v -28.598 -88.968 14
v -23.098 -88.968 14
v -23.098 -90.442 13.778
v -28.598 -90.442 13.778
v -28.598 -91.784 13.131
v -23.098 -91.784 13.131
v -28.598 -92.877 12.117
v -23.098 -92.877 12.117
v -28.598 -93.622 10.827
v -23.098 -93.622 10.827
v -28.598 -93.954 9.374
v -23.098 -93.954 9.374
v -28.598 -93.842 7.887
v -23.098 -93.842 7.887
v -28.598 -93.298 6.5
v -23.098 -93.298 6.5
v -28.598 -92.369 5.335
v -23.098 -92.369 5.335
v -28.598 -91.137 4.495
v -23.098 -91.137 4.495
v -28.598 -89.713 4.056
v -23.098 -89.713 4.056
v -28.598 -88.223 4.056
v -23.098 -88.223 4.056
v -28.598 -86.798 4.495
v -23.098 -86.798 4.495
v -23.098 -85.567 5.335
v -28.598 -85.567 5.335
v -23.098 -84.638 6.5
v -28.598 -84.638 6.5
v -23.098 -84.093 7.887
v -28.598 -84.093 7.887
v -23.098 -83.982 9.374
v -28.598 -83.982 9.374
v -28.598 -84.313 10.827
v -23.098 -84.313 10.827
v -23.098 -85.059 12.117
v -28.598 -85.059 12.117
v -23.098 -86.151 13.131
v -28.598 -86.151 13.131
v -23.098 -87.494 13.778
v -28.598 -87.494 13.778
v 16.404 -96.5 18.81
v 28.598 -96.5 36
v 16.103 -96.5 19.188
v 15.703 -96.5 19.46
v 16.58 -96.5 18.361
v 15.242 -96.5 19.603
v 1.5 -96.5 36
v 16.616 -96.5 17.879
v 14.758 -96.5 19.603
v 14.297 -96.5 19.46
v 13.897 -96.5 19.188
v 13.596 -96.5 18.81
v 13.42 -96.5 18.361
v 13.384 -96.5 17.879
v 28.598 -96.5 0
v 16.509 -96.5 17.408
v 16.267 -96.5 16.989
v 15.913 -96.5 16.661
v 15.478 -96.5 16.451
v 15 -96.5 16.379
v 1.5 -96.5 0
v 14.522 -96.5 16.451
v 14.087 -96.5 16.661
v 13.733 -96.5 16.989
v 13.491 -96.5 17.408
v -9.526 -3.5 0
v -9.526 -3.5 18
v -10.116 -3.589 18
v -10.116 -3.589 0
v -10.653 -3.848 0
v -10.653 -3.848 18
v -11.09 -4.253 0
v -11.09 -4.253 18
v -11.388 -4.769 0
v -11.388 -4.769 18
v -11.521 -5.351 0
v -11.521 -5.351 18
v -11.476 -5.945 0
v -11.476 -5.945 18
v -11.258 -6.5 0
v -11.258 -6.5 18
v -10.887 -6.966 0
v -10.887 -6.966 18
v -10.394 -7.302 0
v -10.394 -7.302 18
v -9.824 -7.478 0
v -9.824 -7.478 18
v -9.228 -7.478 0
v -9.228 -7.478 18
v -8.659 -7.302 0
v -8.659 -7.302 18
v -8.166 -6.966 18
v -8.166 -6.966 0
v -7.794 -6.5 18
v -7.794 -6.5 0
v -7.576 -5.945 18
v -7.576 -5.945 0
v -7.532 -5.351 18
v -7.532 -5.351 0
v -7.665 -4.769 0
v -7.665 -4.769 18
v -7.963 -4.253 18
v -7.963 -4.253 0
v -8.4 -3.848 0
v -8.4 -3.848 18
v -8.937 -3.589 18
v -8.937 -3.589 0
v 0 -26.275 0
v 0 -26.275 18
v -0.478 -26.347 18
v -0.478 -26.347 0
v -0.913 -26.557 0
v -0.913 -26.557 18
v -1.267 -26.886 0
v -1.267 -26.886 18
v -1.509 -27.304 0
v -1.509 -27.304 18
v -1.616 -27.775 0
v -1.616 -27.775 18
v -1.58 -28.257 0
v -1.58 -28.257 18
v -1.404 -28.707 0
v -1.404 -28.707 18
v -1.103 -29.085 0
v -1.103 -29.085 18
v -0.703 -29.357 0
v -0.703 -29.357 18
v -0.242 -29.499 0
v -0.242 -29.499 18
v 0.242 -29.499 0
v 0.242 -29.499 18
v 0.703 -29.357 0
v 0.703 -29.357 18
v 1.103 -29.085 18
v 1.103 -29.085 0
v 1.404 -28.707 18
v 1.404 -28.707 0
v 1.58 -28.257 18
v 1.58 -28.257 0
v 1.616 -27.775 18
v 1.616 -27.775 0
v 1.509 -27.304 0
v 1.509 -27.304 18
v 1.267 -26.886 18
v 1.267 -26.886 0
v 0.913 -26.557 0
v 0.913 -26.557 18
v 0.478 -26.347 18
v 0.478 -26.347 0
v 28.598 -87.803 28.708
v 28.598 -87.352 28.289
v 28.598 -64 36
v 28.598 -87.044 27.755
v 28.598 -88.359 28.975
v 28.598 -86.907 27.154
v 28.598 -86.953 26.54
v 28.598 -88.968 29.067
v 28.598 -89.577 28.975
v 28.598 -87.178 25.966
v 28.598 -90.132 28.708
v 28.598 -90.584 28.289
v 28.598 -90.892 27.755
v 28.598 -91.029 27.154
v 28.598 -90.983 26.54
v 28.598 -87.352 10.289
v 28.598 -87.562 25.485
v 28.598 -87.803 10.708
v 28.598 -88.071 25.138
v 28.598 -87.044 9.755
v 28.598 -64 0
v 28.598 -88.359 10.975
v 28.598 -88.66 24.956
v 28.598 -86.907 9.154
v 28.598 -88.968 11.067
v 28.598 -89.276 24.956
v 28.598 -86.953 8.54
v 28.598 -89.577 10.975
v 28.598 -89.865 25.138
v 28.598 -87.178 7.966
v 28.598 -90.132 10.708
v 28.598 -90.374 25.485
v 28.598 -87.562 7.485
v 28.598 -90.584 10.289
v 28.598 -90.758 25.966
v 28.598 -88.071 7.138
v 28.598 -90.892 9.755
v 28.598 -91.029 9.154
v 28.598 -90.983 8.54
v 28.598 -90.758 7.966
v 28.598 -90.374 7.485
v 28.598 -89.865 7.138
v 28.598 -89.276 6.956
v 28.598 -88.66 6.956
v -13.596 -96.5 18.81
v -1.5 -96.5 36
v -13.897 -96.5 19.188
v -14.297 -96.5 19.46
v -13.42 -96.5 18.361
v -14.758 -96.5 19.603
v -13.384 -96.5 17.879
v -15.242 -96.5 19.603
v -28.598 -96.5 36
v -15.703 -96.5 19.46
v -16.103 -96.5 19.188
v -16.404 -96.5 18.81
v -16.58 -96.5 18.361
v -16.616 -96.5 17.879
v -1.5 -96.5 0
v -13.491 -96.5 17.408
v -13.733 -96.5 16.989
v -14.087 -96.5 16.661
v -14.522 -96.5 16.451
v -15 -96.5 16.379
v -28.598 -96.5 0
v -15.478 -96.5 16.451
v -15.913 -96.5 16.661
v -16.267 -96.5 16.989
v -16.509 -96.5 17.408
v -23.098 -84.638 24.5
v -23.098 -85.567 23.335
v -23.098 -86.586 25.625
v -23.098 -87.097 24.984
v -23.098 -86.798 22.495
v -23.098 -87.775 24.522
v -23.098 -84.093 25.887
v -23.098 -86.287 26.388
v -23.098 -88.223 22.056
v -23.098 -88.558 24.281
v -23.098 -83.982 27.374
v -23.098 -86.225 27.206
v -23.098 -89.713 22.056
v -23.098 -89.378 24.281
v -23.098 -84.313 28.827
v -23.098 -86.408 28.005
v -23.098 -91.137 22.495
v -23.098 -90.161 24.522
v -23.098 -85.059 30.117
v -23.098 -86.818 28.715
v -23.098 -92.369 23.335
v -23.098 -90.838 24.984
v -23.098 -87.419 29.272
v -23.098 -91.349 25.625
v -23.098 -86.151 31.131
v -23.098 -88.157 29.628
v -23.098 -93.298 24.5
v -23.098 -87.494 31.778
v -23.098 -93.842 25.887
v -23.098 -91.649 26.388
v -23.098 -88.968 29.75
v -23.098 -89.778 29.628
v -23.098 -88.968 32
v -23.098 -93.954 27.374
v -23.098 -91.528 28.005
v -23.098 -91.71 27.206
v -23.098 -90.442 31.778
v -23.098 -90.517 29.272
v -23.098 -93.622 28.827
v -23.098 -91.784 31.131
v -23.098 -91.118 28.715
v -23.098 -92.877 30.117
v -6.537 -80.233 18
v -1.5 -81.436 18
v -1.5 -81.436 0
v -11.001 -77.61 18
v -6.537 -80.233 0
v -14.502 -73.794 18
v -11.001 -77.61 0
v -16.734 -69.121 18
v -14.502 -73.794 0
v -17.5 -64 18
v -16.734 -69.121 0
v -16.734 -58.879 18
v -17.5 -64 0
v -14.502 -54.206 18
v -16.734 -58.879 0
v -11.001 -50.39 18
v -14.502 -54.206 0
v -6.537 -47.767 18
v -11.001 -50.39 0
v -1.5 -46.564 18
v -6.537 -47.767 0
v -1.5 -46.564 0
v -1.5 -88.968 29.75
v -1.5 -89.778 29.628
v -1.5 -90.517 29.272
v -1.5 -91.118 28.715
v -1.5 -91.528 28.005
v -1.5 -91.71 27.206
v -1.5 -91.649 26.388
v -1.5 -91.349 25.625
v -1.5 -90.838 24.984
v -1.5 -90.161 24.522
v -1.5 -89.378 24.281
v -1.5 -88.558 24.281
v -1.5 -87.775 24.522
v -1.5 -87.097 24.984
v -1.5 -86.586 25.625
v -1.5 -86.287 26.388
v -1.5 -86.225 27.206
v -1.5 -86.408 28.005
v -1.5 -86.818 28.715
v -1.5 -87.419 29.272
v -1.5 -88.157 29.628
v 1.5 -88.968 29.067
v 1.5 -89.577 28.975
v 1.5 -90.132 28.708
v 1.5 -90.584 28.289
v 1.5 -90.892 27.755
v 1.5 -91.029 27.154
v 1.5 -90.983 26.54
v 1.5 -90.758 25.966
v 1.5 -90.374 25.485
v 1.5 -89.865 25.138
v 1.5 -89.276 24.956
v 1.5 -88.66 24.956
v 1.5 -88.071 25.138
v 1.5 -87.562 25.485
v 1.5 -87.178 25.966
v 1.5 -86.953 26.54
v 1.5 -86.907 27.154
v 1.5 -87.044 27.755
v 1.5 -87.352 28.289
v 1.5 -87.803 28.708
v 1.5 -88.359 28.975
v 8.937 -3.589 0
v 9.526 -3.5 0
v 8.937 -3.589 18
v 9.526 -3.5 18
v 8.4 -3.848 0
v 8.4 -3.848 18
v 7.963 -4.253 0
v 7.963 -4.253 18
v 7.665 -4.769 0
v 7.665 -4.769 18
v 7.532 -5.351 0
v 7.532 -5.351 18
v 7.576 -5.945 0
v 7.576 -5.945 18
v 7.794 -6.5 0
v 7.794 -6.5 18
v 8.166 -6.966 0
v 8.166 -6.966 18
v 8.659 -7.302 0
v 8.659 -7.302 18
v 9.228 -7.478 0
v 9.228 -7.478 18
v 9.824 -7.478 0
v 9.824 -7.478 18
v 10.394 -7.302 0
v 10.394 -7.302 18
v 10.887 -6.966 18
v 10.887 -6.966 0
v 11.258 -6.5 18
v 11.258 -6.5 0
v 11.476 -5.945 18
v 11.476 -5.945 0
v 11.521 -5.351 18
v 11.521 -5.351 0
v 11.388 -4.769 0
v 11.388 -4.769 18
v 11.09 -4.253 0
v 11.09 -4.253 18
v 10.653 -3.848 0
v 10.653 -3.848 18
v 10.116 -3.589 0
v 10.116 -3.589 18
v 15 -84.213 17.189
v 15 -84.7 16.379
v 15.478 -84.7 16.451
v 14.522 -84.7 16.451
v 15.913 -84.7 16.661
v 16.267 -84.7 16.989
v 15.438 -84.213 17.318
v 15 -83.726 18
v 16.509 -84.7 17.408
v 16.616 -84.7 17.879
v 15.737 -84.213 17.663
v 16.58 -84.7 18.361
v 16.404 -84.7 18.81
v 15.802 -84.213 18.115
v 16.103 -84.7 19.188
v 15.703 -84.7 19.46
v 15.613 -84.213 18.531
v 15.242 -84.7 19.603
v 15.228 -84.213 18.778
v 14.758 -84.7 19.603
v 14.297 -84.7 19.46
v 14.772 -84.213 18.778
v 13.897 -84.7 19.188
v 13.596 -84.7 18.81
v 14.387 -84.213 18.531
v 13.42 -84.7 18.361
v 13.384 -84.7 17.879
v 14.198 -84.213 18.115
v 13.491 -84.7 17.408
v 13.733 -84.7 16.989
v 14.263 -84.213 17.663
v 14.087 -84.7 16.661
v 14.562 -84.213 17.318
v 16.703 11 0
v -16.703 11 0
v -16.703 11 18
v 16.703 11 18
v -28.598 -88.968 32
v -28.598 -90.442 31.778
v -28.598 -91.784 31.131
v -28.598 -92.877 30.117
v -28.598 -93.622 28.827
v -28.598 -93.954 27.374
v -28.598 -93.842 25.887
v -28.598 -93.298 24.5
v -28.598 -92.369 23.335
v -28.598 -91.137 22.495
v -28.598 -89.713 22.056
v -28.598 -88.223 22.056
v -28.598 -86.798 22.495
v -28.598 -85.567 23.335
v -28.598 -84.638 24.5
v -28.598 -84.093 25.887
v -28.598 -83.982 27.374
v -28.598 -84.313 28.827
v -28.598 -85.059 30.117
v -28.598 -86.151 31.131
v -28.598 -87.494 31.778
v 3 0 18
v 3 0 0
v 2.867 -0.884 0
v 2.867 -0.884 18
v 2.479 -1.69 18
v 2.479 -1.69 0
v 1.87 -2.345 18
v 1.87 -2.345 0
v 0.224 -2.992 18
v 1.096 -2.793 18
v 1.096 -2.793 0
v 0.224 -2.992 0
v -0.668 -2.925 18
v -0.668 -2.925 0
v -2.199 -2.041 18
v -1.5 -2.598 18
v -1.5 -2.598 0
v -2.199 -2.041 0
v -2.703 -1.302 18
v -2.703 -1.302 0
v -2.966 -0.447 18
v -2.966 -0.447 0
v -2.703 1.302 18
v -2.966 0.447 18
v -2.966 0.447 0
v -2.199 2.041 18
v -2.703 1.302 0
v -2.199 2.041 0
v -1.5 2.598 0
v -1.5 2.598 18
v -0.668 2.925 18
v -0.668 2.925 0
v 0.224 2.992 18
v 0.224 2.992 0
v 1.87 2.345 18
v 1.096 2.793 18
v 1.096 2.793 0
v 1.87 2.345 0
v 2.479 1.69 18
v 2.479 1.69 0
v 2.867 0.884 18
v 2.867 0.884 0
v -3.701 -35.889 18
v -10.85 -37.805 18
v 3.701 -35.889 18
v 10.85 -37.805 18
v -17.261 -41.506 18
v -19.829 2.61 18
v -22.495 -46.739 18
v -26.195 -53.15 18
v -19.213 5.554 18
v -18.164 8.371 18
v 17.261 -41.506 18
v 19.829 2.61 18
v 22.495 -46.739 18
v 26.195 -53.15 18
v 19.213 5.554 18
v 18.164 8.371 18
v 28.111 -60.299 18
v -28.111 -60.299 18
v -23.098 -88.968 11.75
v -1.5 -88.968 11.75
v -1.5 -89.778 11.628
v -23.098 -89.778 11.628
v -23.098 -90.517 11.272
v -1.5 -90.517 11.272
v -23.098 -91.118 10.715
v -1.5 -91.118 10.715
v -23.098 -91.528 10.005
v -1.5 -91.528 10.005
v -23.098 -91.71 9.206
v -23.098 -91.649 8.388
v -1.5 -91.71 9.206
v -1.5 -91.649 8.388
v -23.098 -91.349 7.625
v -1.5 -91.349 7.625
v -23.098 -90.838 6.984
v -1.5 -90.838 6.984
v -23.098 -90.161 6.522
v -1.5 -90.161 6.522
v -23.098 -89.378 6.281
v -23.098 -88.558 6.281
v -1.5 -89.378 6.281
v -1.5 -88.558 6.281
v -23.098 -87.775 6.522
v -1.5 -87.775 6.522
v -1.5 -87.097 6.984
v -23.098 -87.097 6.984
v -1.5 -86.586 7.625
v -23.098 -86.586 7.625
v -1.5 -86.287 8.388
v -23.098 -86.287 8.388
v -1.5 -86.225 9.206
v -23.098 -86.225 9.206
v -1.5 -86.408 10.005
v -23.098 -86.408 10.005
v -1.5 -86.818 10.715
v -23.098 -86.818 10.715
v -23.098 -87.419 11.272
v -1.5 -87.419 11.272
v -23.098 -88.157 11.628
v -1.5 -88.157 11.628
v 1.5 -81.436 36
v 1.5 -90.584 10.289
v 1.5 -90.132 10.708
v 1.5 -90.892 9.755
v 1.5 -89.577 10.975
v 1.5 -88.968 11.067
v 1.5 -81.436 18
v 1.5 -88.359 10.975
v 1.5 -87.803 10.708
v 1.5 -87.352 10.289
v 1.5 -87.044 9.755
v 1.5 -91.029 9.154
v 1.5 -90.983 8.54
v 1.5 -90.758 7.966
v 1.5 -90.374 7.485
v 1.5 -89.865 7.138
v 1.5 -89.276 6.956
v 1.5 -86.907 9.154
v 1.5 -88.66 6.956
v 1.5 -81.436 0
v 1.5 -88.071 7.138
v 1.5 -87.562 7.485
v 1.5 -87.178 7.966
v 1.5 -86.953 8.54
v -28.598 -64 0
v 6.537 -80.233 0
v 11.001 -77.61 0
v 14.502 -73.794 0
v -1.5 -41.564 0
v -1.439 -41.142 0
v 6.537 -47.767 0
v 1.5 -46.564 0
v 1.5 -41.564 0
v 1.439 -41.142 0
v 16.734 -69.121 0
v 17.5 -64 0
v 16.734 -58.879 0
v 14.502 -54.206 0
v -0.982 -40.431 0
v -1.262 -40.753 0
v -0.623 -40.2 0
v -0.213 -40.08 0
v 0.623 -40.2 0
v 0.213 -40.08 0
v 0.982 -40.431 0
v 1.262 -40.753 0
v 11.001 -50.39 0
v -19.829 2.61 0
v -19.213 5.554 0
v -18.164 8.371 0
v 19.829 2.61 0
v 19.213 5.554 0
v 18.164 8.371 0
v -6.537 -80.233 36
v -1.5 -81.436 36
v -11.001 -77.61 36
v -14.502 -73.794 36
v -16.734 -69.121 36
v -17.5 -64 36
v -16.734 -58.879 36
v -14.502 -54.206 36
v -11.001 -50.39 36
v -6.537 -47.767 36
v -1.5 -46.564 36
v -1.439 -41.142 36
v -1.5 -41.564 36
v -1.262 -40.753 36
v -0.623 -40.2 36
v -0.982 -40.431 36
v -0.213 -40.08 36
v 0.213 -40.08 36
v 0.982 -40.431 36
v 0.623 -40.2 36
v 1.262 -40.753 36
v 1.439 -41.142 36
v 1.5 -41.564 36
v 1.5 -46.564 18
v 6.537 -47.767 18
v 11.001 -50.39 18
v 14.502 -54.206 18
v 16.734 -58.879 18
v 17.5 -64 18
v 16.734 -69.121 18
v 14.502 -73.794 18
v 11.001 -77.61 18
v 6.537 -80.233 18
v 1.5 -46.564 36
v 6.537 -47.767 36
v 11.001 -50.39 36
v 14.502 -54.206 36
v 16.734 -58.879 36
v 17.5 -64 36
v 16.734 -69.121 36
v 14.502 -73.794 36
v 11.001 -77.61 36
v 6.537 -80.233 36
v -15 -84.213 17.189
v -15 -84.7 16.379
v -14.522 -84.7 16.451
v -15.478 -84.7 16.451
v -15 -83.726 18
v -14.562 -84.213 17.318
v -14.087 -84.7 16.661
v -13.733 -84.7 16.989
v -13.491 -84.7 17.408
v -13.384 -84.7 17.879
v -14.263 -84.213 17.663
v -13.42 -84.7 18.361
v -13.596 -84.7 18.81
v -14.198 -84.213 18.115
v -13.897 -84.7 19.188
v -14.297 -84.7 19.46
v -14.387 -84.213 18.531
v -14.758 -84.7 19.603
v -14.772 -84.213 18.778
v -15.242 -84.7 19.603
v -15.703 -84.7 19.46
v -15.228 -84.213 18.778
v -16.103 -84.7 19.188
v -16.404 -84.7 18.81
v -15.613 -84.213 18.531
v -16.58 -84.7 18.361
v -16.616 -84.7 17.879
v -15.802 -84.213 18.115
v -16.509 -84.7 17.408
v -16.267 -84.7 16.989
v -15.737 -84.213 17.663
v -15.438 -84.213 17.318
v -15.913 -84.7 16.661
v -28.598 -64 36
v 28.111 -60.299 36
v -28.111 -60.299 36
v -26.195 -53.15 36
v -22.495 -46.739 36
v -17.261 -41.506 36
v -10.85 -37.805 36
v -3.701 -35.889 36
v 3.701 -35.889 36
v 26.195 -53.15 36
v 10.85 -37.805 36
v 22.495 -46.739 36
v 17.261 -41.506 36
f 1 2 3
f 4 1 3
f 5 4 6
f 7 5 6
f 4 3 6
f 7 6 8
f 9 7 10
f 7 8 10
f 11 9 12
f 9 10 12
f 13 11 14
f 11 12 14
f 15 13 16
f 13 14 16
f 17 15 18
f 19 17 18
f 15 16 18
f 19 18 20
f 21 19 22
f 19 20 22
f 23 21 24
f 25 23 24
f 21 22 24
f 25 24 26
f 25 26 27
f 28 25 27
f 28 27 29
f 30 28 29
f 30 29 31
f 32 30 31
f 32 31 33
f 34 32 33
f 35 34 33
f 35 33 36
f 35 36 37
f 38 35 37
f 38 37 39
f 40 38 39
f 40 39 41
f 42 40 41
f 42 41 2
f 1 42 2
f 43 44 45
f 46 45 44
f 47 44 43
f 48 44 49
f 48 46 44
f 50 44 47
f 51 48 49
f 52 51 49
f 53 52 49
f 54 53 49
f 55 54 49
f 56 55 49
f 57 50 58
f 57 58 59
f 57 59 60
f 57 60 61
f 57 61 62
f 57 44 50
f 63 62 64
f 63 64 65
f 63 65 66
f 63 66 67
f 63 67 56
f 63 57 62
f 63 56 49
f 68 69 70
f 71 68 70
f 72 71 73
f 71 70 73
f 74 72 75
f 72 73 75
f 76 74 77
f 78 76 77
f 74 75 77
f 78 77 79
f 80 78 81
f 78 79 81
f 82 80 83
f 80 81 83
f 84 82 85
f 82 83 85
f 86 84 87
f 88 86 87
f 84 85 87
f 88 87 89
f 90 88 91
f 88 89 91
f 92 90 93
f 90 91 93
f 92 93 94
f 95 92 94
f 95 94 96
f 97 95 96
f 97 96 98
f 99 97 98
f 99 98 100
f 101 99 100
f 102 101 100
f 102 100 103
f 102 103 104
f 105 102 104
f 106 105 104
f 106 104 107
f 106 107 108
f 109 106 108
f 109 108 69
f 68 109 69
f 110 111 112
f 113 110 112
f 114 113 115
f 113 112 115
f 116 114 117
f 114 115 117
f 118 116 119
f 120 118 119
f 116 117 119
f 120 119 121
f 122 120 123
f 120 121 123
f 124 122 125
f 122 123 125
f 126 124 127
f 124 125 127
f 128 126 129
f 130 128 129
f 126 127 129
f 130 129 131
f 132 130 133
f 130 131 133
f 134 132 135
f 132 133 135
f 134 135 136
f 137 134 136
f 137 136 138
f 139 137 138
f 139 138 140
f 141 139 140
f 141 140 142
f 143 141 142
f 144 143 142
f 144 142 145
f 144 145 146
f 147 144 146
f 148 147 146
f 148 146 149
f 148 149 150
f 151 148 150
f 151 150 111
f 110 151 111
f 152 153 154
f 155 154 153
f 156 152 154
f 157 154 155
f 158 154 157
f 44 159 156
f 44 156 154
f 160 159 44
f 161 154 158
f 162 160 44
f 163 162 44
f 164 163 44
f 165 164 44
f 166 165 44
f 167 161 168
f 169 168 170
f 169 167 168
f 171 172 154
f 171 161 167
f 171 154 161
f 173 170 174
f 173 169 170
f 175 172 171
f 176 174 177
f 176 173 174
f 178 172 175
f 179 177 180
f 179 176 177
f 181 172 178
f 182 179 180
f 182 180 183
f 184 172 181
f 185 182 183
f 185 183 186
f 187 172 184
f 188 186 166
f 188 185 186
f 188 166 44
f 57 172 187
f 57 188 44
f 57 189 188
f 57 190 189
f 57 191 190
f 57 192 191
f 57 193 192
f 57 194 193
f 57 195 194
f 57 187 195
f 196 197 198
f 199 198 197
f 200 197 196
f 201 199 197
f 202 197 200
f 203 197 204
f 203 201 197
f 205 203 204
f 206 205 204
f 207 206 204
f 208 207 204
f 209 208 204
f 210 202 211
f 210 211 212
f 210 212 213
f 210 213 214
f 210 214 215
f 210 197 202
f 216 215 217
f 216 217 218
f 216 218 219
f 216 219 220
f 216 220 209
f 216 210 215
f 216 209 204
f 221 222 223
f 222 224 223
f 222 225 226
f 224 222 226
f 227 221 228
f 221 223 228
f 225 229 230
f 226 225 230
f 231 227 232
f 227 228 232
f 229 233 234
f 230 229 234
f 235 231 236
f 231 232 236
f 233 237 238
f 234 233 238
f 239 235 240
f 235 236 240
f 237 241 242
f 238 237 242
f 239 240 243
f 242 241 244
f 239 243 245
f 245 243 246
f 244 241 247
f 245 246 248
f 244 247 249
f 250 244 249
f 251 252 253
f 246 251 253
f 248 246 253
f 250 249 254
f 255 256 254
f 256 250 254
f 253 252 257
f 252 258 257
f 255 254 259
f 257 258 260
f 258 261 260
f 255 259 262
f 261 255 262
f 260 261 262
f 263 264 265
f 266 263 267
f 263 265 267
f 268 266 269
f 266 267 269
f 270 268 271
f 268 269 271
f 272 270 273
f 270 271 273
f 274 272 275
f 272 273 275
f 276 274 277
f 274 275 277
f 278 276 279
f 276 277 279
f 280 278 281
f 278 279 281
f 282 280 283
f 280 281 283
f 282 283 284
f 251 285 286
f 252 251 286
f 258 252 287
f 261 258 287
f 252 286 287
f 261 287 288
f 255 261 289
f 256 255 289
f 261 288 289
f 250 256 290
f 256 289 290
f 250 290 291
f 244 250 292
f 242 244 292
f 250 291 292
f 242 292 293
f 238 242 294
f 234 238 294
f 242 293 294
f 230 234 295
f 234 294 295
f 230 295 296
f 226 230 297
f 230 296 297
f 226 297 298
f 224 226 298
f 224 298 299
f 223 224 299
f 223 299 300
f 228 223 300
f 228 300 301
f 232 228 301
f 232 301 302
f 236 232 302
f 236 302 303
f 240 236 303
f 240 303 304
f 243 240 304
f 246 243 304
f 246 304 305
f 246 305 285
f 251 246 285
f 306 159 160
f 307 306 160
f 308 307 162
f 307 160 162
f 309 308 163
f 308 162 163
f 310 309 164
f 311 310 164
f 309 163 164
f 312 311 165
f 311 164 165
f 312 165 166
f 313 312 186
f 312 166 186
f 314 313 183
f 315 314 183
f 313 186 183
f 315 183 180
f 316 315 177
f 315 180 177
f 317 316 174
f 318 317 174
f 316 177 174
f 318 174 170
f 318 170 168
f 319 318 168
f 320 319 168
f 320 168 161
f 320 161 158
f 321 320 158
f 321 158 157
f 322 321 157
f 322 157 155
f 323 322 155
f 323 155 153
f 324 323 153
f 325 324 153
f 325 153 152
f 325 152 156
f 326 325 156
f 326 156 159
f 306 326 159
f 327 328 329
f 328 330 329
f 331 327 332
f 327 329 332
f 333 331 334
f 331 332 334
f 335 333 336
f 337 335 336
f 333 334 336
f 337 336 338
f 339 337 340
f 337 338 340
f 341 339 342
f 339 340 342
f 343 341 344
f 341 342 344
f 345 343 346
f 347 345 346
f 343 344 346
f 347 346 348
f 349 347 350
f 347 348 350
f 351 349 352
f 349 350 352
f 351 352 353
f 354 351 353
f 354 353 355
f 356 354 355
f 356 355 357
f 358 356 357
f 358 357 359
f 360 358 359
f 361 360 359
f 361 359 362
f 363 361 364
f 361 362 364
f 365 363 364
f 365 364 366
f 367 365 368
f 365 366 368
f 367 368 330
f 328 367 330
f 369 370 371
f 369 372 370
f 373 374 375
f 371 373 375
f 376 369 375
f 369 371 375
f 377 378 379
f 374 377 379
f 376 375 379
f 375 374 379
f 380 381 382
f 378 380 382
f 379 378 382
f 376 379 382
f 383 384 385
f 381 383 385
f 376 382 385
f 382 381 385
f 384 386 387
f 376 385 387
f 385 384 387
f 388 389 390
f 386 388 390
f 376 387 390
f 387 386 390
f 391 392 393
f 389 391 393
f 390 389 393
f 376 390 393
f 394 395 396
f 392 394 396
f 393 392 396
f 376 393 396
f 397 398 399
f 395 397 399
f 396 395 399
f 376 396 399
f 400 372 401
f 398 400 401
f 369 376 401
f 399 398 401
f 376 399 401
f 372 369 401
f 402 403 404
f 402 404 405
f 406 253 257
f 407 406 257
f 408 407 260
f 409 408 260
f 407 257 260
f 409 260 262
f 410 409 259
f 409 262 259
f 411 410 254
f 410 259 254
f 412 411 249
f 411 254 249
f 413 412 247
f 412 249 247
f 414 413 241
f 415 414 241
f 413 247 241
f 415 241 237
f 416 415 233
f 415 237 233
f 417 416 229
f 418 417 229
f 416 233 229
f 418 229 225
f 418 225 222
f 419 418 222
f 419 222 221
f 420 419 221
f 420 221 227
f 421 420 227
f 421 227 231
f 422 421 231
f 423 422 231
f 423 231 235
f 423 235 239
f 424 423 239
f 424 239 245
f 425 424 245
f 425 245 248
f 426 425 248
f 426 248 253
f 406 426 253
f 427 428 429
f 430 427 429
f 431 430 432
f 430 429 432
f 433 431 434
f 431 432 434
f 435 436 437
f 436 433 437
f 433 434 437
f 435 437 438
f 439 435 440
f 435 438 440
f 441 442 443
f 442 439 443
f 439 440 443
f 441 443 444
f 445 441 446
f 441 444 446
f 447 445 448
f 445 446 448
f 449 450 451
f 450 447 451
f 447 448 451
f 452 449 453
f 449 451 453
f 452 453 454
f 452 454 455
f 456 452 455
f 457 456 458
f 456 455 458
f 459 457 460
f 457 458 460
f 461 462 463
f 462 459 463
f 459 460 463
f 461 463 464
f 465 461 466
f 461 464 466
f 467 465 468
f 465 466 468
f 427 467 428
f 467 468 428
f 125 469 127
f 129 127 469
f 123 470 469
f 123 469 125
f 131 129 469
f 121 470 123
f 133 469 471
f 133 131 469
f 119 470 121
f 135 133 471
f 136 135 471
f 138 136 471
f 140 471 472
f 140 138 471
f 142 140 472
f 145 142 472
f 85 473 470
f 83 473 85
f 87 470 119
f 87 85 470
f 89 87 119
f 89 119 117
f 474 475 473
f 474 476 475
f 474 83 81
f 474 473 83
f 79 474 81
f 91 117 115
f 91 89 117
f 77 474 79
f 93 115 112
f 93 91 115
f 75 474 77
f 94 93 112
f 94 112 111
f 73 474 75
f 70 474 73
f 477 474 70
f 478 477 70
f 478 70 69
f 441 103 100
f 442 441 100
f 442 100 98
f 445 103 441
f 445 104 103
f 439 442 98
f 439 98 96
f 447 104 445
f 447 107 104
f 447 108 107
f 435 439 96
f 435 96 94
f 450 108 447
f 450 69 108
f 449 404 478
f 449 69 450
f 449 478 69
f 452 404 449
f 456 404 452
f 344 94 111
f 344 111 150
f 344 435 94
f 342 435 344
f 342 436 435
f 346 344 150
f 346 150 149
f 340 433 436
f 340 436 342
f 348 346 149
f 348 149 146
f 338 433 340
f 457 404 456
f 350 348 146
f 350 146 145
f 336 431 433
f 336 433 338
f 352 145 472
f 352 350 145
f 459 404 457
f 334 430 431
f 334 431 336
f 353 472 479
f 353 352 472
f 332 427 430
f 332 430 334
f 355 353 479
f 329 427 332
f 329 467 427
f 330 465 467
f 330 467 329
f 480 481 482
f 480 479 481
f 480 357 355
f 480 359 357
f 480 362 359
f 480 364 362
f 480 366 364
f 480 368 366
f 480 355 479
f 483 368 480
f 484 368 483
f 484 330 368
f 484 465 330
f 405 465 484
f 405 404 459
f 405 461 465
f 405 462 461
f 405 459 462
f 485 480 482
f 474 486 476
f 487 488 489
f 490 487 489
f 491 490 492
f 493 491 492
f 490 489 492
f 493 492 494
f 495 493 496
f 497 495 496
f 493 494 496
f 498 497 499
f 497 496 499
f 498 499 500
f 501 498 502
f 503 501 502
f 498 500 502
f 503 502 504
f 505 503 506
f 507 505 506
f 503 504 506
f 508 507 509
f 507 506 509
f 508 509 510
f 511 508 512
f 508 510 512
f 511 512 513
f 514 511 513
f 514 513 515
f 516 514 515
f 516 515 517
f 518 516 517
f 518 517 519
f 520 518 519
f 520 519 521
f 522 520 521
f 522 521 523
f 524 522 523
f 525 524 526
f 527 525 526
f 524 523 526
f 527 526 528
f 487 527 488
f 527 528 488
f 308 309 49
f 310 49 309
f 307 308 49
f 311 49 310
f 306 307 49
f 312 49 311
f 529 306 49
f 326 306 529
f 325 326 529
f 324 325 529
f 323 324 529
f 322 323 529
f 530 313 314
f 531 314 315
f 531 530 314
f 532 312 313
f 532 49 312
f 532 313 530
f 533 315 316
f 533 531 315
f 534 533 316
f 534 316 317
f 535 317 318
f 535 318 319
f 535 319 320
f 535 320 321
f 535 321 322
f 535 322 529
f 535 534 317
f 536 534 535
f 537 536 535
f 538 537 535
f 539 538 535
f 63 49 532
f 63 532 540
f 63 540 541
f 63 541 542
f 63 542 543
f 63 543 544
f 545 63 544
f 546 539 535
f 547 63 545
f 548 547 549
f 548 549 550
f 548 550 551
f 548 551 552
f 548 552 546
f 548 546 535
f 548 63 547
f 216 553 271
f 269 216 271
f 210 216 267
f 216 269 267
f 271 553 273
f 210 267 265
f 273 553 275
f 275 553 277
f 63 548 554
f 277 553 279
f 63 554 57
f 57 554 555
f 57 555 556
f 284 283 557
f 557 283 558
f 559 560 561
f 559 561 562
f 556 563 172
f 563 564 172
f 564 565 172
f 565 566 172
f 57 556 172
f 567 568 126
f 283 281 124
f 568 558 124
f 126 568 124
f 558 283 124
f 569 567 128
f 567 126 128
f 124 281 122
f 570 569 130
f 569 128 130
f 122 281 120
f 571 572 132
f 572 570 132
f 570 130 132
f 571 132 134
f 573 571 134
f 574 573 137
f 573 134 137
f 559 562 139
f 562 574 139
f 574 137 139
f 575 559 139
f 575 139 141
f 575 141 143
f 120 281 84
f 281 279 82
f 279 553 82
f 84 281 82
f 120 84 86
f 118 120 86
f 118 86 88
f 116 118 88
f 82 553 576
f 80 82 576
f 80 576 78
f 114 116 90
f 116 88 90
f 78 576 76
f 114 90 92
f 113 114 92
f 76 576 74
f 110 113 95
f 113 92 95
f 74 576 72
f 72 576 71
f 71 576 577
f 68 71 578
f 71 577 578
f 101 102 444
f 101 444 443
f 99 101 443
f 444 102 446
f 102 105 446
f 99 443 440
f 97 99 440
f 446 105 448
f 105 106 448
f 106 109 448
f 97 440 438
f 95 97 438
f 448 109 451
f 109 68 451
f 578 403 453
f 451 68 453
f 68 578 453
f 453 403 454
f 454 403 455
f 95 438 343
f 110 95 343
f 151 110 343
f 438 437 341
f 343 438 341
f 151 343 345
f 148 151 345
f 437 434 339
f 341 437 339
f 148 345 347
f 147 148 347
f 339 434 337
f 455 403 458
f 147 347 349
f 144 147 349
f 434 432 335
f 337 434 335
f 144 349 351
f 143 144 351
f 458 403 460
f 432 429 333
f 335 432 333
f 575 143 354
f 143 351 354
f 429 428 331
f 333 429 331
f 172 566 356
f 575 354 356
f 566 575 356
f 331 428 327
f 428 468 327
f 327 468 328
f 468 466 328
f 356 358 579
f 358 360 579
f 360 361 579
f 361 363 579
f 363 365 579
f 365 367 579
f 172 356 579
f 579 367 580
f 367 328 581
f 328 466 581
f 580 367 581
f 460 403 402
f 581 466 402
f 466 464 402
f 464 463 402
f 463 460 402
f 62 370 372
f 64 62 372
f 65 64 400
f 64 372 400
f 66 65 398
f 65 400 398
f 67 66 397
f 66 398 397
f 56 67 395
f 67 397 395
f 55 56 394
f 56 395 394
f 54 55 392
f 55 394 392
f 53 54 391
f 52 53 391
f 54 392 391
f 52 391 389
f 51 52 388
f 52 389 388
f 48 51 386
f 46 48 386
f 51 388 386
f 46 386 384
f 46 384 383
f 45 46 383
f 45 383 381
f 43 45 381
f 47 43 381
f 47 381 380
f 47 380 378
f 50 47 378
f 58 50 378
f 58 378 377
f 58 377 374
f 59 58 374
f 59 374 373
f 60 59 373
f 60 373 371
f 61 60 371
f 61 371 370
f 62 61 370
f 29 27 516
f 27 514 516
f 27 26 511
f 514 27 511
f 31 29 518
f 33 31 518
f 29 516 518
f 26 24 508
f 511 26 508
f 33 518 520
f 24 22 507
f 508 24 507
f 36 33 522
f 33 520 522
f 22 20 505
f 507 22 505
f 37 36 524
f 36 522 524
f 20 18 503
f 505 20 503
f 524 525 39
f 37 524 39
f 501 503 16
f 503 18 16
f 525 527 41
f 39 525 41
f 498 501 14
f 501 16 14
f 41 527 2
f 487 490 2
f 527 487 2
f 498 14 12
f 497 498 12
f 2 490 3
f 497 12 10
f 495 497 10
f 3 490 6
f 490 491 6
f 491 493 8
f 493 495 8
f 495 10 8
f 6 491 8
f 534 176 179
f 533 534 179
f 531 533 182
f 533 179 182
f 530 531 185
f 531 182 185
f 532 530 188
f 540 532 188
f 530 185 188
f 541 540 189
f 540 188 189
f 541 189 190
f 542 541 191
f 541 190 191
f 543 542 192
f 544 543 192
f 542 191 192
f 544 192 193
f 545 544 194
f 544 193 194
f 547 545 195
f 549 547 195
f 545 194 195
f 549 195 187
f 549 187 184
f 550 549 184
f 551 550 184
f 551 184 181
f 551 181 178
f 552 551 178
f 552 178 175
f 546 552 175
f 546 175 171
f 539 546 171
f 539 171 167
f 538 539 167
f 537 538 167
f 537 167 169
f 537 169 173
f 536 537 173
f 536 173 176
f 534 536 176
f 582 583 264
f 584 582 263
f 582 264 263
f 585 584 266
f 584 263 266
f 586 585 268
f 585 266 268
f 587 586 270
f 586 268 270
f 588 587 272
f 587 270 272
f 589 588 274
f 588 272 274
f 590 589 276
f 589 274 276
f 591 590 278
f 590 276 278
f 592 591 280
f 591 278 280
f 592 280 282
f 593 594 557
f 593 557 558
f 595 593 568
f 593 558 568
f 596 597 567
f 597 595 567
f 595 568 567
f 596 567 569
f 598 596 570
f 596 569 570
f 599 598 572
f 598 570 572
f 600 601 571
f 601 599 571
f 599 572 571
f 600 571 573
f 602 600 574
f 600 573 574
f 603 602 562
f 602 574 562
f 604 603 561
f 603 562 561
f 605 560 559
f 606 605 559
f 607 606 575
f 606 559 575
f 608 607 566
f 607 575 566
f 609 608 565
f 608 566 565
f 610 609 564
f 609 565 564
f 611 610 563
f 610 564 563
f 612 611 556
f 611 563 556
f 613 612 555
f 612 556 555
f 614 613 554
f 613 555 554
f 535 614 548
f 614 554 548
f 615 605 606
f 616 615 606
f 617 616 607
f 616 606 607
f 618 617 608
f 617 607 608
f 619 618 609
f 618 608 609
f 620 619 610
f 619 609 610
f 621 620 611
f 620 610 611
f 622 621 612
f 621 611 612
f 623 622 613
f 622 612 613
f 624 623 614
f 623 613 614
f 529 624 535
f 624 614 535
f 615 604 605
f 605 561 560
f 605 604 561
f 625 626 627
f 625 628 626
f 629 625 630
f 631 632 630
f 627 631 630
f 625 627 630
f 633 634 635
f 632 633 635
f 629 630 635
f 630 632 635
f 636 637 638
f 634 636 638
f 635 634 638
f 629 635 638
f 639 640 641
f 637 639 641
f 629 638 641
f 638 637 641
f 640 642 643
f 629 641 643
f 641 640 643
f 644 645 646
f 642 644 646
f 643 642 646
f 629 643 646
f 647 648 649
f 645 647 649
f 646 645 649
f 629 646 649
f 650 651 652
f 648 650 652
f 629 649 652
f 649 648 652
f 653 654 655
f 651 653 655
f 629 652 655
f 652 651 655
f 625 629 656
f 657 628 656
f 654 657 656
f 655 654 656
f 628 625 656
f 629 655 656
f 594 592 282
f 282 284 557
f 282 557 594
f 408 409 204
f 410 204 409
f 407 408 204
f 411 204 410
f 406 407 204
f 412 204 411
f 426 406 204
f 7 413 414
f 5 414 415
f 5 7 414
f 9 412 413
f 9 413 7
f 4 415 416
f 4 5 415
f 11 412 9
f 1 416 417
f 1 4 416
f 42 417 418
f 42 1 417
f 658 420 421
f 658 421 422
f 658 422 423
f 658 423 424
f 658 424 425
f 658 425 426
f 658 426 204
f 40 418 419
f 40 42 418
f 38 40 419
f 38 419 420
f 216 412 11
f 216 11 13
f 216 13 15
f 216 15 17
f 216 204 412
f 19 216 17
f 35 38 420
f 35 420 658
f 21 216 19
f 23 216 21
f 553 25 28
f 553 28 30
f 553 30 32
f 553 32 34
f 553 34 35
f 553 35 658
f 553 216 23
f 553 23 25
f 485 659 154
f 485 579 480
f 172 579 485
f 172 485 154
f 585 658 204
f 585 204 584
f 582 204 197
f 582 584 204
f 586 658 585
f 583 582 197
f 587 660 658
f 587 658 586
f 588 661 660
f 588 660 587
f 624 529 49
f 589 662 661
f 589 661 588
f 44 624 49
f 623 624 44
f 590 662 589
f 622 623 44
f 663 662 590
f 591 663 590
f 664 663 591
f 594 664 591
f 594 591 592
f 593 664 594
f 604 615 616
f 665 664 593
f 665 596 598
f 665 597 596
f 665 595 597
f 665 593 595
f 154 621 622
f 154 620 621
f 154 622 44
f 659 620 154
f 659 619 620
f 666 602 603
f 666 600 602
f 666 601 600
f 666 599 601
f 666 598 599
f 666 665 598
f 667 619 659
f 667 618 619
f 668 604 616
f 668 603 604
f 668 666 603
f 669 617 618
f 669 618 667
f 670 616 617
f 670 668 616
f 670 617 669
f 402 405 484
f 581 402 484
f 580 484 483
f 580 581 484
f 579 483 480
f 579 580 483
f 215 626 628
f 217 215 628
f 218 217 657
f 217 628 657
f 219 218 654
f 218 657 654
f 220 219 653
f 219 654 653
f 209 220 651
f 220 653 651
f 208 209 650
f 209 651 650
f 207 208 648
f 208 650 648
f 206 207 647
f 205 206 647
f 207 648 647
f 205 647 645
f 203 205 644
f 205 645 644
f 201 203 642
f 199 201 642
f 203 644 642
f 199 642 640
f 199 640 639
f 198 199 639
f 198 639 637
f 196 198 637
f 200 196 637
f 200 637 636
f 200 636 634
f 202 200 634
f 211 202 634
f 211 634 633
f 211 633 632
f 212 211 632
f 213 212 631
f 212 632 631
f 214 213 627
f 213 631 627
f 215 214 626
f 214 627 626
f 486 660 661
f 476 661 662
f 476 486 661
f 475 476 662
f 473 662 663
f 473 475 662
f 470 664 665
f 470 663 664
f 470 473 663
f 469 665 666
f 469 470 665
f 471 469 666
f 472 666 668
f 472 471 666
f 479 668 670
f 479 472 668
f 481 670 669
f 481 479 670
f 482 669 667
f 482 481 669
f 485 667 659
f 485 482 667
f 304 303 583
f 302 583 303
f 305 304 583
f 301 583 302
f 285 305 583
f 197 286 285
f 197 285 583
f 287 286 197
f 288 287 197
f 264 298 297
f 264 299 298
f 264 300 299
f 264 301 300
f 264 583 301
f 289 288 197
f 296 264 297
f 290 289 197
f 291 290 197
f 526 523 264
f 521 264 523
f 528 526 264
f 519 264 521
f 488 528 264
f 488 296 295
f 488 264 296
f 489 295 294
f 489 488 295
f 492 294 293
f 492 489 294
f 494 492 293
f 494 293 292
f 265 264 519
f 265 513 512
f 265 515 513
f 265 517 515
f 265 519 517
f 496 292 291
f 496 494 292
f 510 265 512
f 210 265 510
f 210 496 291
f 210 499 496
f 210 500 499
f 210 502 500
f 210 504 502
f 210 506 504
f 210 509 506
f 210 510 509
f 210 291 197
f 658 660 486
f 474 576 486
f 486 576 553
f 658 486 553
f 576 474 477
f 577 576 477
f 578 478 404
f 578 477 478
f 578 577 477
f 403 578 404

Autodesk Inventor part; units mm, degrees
ref_plane "YZ Plane" through (0, 0, 0) normal (1, 0, 0) x (0, 1, 0)
ref_plane "XZ Plane" through (0, 0, 0) normal (0, 1, 0) x (-1, 0, 0)
ref_plane "XY Plane" through (0, 0, 0) normal (0, 0, 1) x (1, 0, 0)
sketch "Skizze1" plane through (0, 0, 0) normal (0, 0, 1) x (1, 0, 0)
  circle A0 centre (0, 0) radius 20 construction
  line L0 (-19.8289, 2.6105) -> (-28.5983, -64)
  line L1 (19.8289, 2.6105) -> (28.5983, -64)
  circle A1 centre (0, 0) radius 11 construction
  line L2 (0, 0) -> (0, 20) construction
  line L3 (0, 0) -> (0, -96.5) construction
  circle A2 centre (0, -64) radius 17.5
  line L4 (-19.8289, 2.6105) -> (0, 153.226) construction
  line L5 (19.8289, 2.6105) -> (0, 153.226) construction
  circle A3 centre (0, 25) radius 80 construction
  circle A4 centre (0, -64) radius 6 construction
  arc A5 (19.8289, 2.6105) -> (-19.8289, 2.6105) centre (0, 0) ccw
  line L6 (28.5983, -64) -> (28.5983, -96.5)
  line L7 (28.5983, -96.5) -> (-28.5983, -96.5)
  line L8 (-28.5983, -96.5) -> (-28.5983, -64)
  line L9 (0, -64) -> (-28.5983, -64) construction
  line L10 (0, -89) -> (-28.5983, -89) construction
  line L11 (0, -86.5) -> (-28.5983, -86.5) construction
  line L12 (0, -91.5) -> (-28.5983, -91.5) construction
  line L13 (1.5, -64) -> (-1.5, -64)
  line L14 (-1.5, -64) -> (-1.5, -96.5)
  line L15 (-1.5, -96.5) -> (1.5, -96.5)
  line L16 (1.5, -96.5) -> (1.5, -64)
  line L17 (-16.7033, 11) -> (16.7033, 11)
  circle A6 centre (0, 0) radius 3
  line L18 (-1.5, -46.5644) -> (-1.5, -41.5644)
  arc A7 (1.5, -41.5644) -> (-1.5, -41.5644) centre (0, -41.5644) ccw
  line L19 (1.5, -41.5644) -> (1.5, -46.5644)
  line L20 (1.5, -46.5644) -> (-1.5, -46.5644)
  point P0 (0, 11)
  point P1 (-9.5263, -5.5)
  point P2 (9.5263, -5.5)
  point P3 (0, -55)
  point P4 (0, -58)
  point P5 (0, -46.5)
  point P6 (0, -81.5)
  point P7 (-1.5, -81.4356)
  point P8 (1.5, -81.4356)
  point P9 (0, -46.5644)
  dimension "d9" = 22
  dimension "d54" = 160
  dimension "d56" = 12
  dimension "d2" = 360
  dimension "d10" = 40
  dimension "d47" = 25
  dimension "d51" = 3
  dimension "d52" = 15
  dimension "d55" = 35
  dimension "d61" = 5
  dimension "d62" = 2.5
  dimension "d63" = 5
  dimension "d65" = 3
  dimension "d66" = 5
  dimension "d81" = 11
  dimension "d82" = 6
  dimension "d85" = 3
  dimension "d86" = 5
extrude "Extrusion1" add sketch "Skizze1" along normal blind 18 contours A5 L17 L1 L6 L7 L16 A2 L19 A7 L18 L14 L8 L0
hole "Bohrung1" at (-9.5263, -5.5, 0) at (9.5263, -5.5, 0) direction (0, 0, 1) diameter 4 end through all
sketch "Skizze4" plane through (0, 0, 18) normal (0, 0, 1) x (1, 0, 0)
  circle A0 centre (0, -64) radius 28.3537
  line L0 (28.5983, -64) -> (19.8289, 2.6105) projected
  line L1 (-28.5983, -64) -> (-28.5983, -96.5) projected
  line L2 (-19.8289, 2.6105) -> (-28.5983, -64) projected
  line L3 (28.5983, -96.5) -> (28.5983, -64) projected
  line L4 (1.5, -96.5) -> (28.5983, -96.5) projected
  line L5 (-28.5983, -96.5) -> (-1.5, -96.5) projected
  line L6 (-1.5, -96.5) -> (-1.5, -81.4356) projected
  arc A1 (1.5, -81.4356) -> (-1.5, -81.4356) centre (0, -64) ccw projected
  line L7 (1.5, -81.4356) -> (1.5, -96.5) projected
  line L8 (1.5, -96.5) -> (1.5, -81.4356)
  line L9 (-1.5, -46.5644) -> (-1.5, -41.5644) projected
  arc A2 (1.5, -41.5644) -> (-1.5, -41.5644) centre (0, -41.5644) ccw projected
  line L10 (1.5, -41.5644) -> (1.5, -46.5644) projected
  line L11 (1.5, -46.5644) -> (-1.5, -46.5644) projected
  point P0 (0, 0)
  point P1 (28.1111, -60.2991)
  point P2 (-28.1111, -60.2991)
extrude "Extrusion2" add sketch "Skizze4" along normal blind 18 contours A0 L7 A1 L10 A2 L9 L6 | A0 L0 L3 L4 L7 | A0 L6 L5 L1 L2
ref_plane "Arbeitsebene1" through (0, 0, 18) normal (0, 0, 1) x (1, 0, 0)
sketch "Skizze2" plane through (1.5, -96.5, 0) normal (-1, 0, 0) x (0, 0, 1)
  line L0 (0, 15.0644) -> (0, 0) construction
  line L1 (0, 0) -> (36, 0) construction
  line L2 (0, 15.0644) -> (36, 15.0644) construction
  line L3 (0, 0) -> (18, 0) construction
  line L4 (0, 15.0644) -> (18, 0) construction
  line L5 (18, 15.0644) -> (0, 0) construction
  line L6 (36, 15.0644) -> (36, 0) projected
  line L7 (18, 129) -> (18, -21.5) construction
  point P0 (0, 96.5)
  point P1 (9, 7.5322)
  point P2 (27, 7.5322)
hole "Bohrung3" at (1.5, -88.9678, 9) at (1.5, -88.9678, 27) direction (1, 0, 0) diameter 4.134 end through all thread size "M5x0.8" class "6H" standard "ISO Metric profile"
sketch "Skizze3" plane through (-28.5983, -96.5, 0) normal (-1, 0, 0) x (0, 0, 1)
  point P0 (0, 96.5)
  point P1 (9, 7.5322)
  point P2 (27, 7.5322)
hole "Bohrung4" at (-28.5983, -88.9678, 9) at (-28.5983, -88.9678, 27) direction (1, 0, 0) diameter 5.5 depth 27.0983 counterbore diameter 10 counterbore depth 5.5 clearance for "Inbusschraube DIN EN ISO 4762" size "M5" standard "DIN"
sketch "Skizze5" plane through (1.5, -96.5, 0) normal (0, -1, 0) x (1, 0, 0)
  line L0 (38.5377, 27) -> (-41.5377, 27) construction
  line L1 (38.5377, 9) -> (-41.5377, 9) construction
  line L2 (-41.5377, 18) -> (38.5377, 18) construction
  line L3 (-3, 36) -> (0, 36) construction
  line L4 (-1.5, 36) -> (-1.5, 0) construction
  point P0 (13.5, 18)
  point P1 (-16.5, 18)
  dimension "d87" = 15
  dimension "d88" = 30
hole "Bohrung5" at (15, -96.5, 18) at (-15, -96.5, 18) direction (0, 1, 0) diameter 3.242 depth 11.8 tip angle 118 thread size "M4x0.7" class "6H" standard "ISO Metric profile"
sketch "Skizze6" plane through (0, 0, 0) normal (0, 0, -1) x (-1, 0, 0)
  arc A0 (28.1111, -60.2991) -> (-28.1111, -60.2991) centre (0, -64) ccw construction
  line L0 (0, 0) -> (0, -96.5) construction
  circle A1 centre (0, 0) radius 20 construction
  point P0 (0, -27.8963)
  point P1 (0, -20)
  point P2 (0, -35.6463)
  dimension "d96" = 15.6463
  dimension "d97" = 7.75
hole "Bohrung6" at (0, -27.8963, 0) direction (0, 0, 1) diameter 3.242 end through all thread size "M4x0.7" class "6H" standard "ISO Metric profile"
equation "\"d9\" = FixationHole_Dia"
equation "\"d10\" = MotrGC_Part_OuterDia"
equation "\"d47\" = SmallCapston_Offset"
equation "\"FixationHole_Dia\" = 22"
equation "\"MotrGC_Part_OuterDia\" = 40"
equation "\"SmallCapston_Offset\" = 25"
properties part number "GC_Motor_Aussenscheibe" material "PBT-Kunststoff"
